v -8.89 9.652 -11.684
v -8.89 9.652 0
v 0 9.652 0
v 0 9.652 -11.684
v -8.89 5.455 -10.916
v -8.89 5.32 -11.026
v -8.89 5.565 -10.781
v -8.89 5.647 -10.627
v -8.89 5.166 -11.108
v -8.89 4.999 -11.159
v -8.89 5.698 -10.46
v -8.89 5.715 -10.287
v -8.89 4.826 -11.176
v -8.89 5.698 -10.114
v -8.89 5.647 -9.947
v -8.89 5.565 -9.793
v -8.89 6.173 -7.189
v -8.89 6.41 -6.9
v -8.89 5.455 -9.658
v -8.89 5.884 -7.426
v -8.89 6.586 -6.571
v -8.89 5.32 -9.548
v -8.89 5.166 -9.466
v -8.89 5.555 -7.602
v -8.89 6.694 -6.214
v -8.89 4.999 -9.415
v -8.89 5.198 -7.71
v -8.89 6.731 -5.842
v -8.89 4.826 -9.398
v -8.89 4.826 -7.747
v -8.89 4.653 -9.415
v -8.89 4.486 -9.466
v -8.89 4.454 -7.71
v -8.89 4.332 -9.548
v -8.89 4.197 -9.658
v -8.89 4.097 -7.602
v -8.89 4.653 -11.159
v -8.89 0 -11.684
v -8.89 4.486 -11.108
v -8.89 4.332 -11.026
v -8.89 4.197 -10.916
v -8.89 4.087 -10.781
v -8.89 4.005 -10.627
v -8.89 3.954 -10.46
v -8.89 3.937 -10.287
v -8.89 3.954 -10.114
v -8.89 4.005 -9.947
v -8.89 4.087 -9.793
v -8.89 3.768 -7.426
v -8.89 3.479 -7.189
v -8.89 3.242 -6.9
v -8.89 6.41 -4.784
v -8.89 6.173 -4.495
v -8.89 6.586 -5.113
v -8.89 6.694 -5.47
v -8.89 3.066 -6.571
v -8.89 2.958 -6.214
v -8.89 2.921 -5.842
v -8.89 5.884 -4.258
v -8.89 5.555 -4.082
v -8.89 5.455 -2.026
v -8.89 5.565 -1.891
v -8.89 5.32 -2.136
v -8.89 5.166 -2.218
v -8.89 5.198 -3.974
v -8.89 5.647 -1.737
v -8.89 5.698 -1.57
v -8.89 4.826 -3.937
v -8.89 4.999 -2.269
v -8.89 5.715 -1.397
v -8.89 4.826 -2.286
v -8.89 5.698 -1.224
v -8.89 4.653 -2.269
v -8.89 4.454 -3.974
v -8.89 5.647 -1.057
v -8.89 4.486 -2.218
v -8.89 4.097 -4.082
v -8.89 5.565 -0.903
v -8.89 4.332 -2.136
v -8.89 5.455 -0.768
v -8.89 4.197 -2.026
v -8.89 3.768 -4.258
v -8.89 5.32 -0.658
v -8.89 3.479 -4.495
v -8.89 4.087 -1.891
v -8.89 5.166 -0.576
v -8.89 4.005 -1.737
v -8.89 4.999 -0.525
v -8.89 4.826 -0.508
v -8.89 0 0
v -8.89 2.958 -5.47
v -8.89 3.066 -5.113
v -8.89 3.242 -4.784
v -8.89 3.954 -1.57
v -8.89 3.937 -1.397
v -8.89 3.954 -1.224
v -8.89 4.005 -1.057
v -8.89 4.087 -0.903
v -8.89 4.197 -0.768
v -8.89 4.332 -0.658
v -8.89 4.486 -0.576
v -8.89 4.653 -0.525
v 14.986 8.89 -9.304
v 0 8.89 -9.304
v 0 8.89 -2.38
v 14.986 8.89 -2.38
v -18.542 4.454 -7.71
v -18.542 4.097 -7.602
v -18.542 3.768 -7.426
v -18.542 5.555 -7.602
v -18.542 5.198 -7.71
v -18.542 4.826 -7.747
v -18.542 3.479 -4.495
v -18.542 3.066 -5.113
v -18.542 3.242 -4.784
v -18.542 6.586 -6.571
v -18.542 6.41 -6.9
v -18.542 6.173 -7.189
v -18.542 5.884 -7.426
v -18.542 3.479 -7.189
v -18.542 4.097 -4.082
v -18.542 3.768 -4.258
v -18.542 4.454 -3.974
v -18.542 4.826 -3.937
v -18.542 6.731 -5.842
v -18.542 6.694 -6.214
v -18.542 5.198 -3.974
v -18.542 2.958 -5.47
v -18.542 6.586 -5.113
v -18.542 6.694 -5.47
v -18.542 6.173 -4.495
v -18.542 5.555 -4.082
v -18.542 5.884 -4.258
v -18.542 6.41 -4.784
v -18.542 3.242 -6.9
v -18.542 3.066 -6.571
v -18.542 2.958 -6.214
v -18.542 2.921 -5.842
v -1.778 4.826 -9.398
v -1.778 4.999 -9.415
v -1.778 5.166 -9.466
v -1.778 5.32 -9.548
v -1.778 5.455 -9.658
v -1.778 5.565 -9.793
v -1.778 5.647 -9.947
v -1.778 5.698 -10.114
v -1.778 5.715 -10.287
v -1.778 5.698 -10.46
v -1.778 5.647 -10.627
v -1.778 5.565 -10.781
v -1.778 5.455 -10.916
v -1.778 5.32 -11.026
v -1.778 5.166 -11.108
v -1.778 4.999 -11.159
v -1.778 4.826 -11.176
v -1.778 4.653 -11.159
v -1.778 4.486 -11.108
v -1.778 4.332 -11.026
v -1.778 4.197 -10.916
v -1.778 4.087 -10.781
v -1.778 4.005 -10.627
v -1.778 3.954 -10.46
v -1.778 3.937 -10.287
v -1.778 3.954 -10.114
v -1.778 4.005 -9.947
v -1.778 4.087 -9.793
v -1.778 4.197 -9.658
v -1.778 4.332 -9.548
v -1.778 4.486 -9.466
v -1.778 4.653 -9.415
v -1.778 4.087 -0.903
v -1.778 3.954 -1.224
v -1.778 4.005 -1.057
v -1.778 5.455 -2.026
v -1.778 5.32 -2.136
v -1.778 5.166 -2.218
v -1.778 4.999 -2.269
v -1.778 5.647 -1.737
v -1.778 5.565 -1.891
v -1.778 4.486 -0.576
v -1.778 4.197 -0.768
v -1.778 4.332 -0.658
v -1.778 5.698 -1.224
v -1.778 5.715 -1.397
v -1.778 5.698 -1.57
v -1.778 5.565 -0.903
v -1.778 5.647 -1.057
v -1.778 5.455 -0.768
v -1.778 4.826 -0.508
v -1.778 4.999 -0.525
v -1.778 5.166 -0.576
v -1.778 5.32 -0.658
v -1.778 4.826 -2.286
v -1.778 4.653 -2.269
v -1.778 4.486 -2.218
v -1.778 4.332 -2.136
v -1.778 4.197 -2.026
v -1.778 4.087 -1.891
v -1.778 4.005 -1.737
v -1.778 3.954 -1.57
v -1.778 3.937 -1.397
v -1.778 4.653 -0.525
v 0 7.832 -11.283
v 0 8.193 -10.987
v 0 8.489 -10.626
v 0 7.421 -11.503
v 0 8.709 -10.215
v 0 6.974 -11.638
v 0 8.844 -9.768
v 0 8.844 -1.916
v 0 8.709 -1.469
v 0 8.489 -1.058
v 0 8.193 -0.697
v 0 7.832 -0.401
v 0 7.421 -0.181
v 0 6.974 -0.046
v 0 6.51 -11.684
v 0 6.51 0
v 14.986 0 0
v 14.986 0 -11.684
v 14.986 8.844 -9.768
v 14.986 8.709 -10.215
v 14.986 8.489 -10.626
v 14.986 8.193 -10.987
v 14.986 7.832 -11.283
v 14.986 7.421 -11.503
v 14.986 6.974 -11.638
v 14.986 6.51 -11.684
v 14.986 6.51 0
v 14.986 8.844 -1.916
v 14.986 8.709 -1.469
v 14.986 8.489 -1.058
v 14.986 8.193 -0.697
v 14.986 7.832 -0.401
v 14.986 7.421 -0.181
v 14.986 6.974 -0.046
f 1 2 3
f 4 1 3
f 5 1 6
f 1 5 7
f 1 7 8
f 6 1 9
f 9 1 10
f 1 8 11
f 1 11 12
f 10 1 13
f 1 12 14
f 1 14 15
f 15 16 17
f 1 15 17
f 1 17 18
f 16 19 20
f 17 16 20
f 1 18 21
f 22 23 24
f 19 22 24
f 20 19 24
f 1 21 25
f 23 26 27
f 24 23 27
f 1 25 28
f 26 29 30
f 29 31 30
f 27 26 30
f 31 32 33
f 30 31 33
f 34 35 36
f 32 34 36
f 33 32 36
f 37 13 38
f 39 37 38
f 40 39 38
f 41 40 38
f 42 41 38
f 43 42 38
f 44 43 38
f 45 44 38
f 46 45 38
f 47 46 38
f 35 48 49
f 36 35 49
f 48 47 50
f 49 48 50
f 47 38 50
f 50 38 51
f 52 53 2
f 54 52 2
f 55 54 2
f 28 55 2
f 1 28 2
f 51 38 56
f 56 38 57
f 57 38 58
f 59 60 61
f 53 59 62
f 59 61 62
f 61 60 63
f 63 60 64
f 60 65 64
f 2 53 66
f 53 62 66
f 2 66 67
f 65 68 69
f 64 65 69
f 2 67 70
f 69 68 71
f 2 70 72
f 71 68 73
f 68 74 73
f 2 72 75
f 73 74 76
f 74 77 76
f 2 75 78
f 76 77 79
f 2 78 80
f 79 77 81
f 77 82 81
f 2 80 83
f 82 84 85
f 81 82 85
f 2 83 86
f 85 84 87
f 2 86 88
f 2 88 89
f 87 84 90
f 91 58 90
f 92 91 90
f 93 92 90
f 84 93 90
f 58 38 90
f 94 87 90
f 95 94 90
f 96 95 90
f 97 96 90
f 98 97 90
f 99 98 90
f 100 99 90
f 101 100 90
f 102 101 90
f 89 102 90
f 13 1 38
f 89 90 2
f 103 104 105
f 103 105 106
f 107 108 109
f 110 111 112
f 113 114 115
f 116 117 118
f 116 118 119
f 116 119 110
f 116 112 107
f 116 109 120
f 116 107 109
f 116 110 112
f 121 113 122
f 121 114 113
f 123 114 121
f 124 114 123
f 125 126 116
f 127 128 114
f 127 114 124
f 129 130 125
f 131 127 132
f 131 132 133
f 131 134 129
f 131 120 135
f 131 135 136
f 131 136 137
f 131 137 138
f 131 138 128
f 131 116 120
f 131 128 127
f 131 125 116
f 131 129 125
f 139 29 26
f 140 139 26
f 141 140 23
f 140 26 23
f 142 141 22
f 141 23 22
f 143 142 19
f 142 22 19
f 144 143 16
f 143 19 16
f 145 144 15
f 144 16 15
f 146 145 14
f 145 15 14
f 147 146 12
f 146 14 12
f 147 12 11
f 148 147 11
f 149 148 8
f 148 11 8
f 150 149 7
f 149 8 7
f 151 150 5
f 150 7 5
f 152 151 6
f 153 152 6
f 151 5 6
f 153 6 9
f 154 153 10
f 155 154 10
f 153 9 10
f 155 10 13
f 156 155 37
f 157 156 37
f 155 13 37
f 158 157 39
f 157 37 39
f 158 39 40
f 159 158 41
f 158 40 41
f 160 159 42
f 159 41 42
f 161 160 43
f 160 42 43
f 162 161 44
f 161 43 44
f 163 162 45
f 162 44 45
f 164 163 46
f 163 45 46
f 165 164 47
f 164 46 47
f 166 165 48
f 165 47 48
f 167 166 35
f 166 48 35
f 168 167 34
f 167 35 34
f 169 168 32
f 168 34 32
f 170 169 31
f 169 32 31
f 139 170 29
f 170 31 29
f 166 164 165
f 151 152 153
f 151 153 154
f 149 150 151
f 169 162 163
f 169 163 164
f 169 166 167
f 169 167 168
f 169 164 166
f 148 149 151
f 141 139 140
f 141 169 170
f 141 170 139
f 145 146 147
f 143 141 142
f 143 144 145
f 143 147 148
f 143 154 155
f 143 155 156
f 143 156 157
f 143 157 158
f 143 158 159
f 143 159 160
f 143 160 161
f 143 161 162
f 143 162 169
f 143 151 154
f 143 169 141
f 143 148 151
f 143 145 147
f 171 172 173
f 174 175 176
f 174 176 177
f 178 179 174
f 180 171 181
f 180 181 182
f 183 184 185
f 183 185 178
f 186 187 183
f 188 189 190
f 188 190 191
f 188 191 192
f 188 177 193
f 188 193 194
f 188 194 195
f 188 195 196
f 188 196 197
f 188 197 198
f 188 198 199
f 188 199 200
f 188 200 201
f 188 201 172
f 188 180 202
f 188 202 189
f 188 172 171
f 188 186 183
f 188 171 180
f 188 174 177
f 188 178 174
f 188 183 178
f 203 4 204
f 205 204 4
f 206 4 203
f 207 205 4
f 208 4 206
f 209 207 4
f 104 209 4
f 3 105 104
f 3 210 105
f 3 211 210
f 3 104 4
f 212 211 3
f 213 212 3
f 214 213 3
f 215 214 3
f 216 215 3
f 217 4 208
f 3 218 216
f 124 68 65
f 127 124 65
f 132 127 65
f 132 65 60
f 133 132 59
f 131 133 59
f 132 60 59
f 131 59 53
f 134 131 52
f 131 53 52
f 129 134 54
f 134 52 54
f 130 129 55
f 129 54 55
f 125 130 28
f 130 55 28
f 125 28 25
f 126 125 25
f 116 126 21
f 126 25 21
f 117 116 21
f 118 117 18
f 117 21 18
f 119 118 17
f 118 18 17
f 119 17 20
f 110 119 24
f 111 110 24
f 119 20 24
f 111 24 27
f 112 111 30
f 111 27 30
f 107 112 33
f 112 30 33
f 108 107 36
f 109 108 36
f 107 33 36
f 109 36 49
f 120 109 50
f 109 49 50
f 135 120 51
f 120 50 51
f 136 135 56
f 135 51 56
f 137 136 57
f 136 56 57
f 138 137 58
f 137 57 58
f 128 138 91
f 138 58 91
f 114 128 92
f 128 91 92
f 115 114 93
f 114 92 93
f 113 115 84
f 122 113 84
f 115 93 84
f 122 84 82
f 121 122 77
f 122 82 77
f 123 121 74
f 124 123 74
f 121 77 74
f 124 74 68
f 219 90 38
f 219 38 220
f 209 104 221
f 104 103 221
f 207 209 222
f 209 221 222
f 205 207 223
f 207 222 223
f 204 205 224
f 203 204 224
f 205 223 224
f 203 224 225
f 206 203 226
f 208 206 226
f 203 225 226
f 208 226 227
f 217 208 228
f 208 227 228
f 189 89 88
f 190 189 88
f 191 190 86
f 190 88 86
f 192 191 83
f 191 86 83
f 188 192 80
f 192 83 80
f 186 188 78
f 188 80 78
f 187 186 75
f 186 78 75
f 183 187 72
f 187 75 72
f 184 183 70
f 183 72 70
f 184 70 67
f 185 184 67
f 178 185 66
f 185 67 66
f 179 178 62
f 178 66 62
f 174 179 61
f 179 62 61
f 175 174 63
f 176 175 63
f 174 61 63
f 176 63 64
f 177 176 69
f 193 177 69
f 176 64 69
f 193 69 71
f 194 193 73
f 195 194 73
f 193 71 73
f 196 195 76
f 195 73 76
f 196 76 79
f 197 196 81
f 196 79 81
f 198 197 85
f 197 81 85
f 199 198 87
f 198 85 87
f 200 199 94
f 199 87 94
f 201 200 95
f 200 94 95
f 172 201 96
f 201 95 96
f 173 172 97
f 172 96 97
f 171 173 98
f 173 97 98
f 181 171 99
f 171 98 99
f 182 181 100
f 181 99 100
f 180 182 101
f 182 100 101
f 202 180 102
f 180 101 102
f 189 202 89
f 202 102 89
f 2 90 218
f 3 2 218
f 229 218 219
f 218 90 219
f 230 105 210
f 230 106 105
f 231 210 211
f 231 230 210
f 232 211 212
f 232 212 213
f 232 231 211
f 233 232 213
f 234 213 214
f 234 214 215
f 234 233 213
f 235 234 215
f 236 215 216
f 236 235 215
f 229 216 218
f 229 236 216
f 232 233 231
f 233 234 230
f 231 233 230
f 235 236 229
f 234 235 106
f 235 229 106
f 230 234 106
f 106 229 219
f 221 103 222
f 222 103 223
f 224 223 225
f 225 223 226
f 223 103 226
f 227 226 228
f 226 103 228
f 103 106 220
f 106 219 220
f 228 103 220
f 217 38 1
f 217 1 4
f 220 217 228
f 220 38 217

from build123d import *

# Parameters (mm, degrees)
SKETCH1_W           = 14.986
SKETCH1_H           = 11.684
BOSS_EXTRUDE2_DEPTH = 8.89
SKETCH3_W           = 8.89
SKETCH3_H           = 11.684
BOSS_EXTRUDE4_DEPTH = 9.652
FILLET1_R           = 2.38
SKETCH4_R           = 1.905
BOSS_EXTRUDE5_DEPTH = 9.652
SKETCH5_R           = 0.889
CUT_EXTRUDE1_DEPTH  = 7.112


with BuildPart() as part:
    # Sketch1 → Boss-Extrude2 (new body)
    with BuildSketch(Plane(origin=(0, 0, 0), x_dir=(1, 0, 0), z_dir=(0, 1, 0))):
        with Locations((7.493, 5.842)):
            Rectangle(SKETCH1_W, SKETCH1_H)
    extrude(amount=BOSS_EXTRUDE2_DEPTH)

    # Sketch3 → Boss-Extrude4 (add)
    with BuildSketch(Plane.XZ):
        with Locations((-4.445, -5.842)):
            Rectangle(SKETCH3_W, SKETCH3_H)
    extrude(amount=-BOSS_EXTRUDE4_DEPTH)

    # Fillet1
    fillet1_edges = [part.edges().sort_by_distance(p)[0] for p in [
        (7.493, 8.89, 0),
        (7.493, 8.89, -11.684),
    ]]
    fillet(fillet1_edges, radius=FILLET1_R)

    # Sketch4 → Boss-Extrude5 (add)
    with BuildSketch(Plane.ZY.offset(8.89)):
        with Locations((-5.842, 4.826)):
            Circle(SKETCH4_R)
    extrude(amount=BOSS_EXTRUDE5_DEPTH)

    # Sketch5 → Cut-Extrude1 (cut)
    with BuildSketch(Plane.ZY.offset(8.89)):
        with Locations((-1.397, 4.826)):
            Circle(SKETCH5_R)
        with Locations((-10.287, 4.826)):
            Circle(SKETCH5_R)
    extrude(amount=-CUT_EXTRUDE1_DEPTH, mode=Mode.SUBTRACT)


solid = part.part
